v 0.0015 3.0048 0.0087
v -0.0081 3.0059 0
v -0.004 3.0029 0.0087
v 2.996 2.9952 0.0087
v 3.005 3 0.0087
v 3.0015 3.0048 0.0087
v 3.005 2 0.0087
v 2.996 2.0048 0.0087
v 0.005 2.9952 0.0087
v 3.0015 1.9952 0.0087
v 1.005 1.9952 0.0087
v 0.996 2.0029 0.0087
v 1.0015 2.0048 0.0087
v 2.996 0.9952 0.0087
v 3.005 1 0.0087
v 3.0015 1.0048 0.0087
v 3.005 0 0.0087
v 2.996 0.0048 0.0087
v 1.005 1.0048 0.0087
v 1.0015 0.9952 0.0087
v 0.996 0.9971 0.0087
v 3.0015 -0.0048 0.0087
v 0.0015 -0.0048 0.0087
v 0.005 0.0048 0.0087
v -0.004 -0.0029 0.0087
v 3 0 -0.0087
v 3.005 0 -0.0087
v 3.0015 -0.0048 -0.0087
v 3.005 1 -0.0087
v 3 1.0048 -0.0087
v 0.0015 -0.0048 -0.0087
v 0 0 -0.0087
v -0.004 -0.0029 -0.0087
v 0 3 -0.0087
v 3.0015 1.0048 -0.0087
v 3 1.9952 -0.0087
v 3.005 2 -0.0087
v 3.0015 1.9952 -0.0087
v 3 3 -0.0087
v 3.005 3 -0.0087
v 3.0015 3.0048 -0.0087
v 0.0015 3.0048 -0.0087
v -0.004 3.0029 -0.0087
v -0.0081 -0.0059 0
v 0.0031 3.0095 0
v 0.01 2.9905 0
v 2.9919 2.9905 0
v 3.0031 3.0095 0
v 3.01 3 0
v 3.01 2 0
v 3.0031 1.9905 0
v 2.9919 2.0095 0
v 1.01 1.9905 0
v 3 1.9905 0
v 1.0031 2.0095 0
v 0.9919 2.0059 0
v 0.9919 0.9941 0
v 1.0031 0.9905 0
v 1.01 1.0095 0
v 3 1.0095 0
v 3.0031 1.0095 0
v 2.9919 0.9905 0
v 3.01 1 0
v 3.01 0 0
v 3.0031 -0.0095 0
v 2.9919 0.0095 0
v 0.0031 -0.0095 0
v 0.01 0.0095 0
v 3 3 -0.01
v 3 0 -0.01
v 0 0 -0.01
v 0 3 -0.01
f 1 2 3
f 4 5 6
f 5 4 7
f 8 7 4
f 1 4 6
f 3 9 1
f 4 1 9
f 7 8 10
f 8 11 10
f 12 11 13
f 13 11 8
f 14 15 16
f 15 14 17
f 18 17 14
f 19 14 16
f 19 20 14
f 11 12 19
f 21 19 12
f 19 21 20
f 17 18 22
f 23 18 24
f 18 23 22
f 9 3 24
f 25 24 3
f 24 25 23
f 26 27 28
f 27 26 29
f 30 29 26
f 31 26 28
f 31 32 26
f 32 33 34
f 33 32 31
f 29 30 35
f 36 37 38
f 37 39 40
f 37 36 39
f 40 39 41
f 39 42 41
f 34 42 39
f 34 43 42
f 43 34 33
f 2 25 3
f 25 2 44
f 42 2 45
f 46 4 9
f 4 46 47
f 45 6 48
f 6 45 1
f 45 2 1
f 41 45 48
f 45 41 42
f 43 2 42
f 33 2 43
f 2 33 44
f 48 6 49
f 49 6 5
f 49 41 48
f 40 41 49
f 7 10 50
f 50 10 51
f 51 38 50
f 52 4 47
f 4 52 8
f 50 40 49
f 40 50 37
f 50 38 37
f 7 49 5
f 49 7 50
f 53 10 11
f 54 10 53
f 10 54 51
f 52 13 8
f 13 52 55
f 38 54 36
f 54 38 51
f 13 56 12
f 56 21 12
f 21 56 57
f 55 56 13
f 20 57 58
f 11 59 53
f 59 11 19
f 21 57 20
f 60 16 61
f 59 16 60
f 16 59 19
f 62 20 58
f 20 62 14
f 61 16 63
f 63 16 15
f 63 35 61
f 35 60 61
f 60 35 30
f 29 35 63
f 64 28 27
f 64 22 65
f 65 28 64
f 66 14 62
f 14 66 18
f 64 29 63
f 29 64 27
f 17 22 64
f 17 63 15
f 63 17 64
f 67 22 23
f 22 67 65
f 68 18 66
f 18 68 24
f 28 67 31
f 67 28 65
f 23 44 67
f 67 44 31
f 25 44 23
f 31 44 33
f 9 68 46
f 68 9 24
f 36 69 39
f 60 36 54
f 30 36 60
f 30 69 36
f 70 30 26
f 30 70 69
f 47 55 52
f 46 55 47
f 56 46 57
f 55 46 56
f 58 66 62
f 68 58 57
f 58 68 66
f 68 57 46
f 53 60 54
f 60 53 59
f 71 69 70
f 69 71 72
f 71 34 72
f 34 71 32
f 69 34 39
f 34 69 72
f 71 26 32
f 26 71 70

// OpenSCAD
hull(){
    translate([0.0, 3.0]) sphere(0.01);
    translate([1.0, 3.0]) sphere(0.01);
}
hull(){
    translate([1.0, 3.0]) sphere(0.01);
    translate([2.0, 3.0]) sphere(0.01);
}
hull(){
    translate([2.0, 3.0]) sphere(0.01);
    translate([3.0, 3.0]) sphere(0.01);
}
hull(){
    translate([3.0, 3.0]) sphere(0.01);
    translate([3.0, 2.0]) sphere(0.01);
}
hull(){
    translate([3.0, 2.0]) sphere(0.01);
    translate([2.0, 2.0]) sphere(0.01);
}
hull(){
    translate([2.0, 2.0]) sphere(0.01);
    translate([1.0, 2.0]) sphere(0.01);
}
hull(){
    translate([1.0, 2.0]) sphere(0.01);
    translate([1.0, 1.0]) sphere(0.01);
}
hull(){
    translate([1.0, 1.0]) sphere(0.01);
    translate([2.0, 1.0]) sphere(0.01);
}
hull(){
    translate([2.0, 1.0]) sphere(0.01);
    translate([3.0, 1.0]) sphere(0.01);
}
hull(){
    translate([3.0, 1.0]) sphere(0.01);
    translate([3.0, 0.0]) sphere(0.01);
}
hull(){
    translate([3.0, 0.0]) sphere(0.01);
    translate([2.0, 0.0]) sphere(0.01);
}
hull(){
    translate([2.0, 0.0]) sphere(0.01);
    translate([1.0, 0.0]) sphere(0.01);
}
hull(){
    translate([1.0, 0.0]) sphere(0.01);
    translate([0.0, 0.0]) sphere(0.01);
}
hull(){
    translate([0.0, 0.0]) sphere(0.01);
    translate([0.0, 1.0]) sphere(0.01);
}
hull(){
    translate([0.0, 1.0]) sphere(0.01);
    translate([0.0, 2.0]) sphere(0.01);
}
hull(){
    translate([0.0, 2.0]) sphere(0.01);
    translate([0.0, 3.0]) sphere(0.01);
}
translate([0,0,-0.01]) color([0.1,0.1,0.1]) cube([3,3,0.01]);
